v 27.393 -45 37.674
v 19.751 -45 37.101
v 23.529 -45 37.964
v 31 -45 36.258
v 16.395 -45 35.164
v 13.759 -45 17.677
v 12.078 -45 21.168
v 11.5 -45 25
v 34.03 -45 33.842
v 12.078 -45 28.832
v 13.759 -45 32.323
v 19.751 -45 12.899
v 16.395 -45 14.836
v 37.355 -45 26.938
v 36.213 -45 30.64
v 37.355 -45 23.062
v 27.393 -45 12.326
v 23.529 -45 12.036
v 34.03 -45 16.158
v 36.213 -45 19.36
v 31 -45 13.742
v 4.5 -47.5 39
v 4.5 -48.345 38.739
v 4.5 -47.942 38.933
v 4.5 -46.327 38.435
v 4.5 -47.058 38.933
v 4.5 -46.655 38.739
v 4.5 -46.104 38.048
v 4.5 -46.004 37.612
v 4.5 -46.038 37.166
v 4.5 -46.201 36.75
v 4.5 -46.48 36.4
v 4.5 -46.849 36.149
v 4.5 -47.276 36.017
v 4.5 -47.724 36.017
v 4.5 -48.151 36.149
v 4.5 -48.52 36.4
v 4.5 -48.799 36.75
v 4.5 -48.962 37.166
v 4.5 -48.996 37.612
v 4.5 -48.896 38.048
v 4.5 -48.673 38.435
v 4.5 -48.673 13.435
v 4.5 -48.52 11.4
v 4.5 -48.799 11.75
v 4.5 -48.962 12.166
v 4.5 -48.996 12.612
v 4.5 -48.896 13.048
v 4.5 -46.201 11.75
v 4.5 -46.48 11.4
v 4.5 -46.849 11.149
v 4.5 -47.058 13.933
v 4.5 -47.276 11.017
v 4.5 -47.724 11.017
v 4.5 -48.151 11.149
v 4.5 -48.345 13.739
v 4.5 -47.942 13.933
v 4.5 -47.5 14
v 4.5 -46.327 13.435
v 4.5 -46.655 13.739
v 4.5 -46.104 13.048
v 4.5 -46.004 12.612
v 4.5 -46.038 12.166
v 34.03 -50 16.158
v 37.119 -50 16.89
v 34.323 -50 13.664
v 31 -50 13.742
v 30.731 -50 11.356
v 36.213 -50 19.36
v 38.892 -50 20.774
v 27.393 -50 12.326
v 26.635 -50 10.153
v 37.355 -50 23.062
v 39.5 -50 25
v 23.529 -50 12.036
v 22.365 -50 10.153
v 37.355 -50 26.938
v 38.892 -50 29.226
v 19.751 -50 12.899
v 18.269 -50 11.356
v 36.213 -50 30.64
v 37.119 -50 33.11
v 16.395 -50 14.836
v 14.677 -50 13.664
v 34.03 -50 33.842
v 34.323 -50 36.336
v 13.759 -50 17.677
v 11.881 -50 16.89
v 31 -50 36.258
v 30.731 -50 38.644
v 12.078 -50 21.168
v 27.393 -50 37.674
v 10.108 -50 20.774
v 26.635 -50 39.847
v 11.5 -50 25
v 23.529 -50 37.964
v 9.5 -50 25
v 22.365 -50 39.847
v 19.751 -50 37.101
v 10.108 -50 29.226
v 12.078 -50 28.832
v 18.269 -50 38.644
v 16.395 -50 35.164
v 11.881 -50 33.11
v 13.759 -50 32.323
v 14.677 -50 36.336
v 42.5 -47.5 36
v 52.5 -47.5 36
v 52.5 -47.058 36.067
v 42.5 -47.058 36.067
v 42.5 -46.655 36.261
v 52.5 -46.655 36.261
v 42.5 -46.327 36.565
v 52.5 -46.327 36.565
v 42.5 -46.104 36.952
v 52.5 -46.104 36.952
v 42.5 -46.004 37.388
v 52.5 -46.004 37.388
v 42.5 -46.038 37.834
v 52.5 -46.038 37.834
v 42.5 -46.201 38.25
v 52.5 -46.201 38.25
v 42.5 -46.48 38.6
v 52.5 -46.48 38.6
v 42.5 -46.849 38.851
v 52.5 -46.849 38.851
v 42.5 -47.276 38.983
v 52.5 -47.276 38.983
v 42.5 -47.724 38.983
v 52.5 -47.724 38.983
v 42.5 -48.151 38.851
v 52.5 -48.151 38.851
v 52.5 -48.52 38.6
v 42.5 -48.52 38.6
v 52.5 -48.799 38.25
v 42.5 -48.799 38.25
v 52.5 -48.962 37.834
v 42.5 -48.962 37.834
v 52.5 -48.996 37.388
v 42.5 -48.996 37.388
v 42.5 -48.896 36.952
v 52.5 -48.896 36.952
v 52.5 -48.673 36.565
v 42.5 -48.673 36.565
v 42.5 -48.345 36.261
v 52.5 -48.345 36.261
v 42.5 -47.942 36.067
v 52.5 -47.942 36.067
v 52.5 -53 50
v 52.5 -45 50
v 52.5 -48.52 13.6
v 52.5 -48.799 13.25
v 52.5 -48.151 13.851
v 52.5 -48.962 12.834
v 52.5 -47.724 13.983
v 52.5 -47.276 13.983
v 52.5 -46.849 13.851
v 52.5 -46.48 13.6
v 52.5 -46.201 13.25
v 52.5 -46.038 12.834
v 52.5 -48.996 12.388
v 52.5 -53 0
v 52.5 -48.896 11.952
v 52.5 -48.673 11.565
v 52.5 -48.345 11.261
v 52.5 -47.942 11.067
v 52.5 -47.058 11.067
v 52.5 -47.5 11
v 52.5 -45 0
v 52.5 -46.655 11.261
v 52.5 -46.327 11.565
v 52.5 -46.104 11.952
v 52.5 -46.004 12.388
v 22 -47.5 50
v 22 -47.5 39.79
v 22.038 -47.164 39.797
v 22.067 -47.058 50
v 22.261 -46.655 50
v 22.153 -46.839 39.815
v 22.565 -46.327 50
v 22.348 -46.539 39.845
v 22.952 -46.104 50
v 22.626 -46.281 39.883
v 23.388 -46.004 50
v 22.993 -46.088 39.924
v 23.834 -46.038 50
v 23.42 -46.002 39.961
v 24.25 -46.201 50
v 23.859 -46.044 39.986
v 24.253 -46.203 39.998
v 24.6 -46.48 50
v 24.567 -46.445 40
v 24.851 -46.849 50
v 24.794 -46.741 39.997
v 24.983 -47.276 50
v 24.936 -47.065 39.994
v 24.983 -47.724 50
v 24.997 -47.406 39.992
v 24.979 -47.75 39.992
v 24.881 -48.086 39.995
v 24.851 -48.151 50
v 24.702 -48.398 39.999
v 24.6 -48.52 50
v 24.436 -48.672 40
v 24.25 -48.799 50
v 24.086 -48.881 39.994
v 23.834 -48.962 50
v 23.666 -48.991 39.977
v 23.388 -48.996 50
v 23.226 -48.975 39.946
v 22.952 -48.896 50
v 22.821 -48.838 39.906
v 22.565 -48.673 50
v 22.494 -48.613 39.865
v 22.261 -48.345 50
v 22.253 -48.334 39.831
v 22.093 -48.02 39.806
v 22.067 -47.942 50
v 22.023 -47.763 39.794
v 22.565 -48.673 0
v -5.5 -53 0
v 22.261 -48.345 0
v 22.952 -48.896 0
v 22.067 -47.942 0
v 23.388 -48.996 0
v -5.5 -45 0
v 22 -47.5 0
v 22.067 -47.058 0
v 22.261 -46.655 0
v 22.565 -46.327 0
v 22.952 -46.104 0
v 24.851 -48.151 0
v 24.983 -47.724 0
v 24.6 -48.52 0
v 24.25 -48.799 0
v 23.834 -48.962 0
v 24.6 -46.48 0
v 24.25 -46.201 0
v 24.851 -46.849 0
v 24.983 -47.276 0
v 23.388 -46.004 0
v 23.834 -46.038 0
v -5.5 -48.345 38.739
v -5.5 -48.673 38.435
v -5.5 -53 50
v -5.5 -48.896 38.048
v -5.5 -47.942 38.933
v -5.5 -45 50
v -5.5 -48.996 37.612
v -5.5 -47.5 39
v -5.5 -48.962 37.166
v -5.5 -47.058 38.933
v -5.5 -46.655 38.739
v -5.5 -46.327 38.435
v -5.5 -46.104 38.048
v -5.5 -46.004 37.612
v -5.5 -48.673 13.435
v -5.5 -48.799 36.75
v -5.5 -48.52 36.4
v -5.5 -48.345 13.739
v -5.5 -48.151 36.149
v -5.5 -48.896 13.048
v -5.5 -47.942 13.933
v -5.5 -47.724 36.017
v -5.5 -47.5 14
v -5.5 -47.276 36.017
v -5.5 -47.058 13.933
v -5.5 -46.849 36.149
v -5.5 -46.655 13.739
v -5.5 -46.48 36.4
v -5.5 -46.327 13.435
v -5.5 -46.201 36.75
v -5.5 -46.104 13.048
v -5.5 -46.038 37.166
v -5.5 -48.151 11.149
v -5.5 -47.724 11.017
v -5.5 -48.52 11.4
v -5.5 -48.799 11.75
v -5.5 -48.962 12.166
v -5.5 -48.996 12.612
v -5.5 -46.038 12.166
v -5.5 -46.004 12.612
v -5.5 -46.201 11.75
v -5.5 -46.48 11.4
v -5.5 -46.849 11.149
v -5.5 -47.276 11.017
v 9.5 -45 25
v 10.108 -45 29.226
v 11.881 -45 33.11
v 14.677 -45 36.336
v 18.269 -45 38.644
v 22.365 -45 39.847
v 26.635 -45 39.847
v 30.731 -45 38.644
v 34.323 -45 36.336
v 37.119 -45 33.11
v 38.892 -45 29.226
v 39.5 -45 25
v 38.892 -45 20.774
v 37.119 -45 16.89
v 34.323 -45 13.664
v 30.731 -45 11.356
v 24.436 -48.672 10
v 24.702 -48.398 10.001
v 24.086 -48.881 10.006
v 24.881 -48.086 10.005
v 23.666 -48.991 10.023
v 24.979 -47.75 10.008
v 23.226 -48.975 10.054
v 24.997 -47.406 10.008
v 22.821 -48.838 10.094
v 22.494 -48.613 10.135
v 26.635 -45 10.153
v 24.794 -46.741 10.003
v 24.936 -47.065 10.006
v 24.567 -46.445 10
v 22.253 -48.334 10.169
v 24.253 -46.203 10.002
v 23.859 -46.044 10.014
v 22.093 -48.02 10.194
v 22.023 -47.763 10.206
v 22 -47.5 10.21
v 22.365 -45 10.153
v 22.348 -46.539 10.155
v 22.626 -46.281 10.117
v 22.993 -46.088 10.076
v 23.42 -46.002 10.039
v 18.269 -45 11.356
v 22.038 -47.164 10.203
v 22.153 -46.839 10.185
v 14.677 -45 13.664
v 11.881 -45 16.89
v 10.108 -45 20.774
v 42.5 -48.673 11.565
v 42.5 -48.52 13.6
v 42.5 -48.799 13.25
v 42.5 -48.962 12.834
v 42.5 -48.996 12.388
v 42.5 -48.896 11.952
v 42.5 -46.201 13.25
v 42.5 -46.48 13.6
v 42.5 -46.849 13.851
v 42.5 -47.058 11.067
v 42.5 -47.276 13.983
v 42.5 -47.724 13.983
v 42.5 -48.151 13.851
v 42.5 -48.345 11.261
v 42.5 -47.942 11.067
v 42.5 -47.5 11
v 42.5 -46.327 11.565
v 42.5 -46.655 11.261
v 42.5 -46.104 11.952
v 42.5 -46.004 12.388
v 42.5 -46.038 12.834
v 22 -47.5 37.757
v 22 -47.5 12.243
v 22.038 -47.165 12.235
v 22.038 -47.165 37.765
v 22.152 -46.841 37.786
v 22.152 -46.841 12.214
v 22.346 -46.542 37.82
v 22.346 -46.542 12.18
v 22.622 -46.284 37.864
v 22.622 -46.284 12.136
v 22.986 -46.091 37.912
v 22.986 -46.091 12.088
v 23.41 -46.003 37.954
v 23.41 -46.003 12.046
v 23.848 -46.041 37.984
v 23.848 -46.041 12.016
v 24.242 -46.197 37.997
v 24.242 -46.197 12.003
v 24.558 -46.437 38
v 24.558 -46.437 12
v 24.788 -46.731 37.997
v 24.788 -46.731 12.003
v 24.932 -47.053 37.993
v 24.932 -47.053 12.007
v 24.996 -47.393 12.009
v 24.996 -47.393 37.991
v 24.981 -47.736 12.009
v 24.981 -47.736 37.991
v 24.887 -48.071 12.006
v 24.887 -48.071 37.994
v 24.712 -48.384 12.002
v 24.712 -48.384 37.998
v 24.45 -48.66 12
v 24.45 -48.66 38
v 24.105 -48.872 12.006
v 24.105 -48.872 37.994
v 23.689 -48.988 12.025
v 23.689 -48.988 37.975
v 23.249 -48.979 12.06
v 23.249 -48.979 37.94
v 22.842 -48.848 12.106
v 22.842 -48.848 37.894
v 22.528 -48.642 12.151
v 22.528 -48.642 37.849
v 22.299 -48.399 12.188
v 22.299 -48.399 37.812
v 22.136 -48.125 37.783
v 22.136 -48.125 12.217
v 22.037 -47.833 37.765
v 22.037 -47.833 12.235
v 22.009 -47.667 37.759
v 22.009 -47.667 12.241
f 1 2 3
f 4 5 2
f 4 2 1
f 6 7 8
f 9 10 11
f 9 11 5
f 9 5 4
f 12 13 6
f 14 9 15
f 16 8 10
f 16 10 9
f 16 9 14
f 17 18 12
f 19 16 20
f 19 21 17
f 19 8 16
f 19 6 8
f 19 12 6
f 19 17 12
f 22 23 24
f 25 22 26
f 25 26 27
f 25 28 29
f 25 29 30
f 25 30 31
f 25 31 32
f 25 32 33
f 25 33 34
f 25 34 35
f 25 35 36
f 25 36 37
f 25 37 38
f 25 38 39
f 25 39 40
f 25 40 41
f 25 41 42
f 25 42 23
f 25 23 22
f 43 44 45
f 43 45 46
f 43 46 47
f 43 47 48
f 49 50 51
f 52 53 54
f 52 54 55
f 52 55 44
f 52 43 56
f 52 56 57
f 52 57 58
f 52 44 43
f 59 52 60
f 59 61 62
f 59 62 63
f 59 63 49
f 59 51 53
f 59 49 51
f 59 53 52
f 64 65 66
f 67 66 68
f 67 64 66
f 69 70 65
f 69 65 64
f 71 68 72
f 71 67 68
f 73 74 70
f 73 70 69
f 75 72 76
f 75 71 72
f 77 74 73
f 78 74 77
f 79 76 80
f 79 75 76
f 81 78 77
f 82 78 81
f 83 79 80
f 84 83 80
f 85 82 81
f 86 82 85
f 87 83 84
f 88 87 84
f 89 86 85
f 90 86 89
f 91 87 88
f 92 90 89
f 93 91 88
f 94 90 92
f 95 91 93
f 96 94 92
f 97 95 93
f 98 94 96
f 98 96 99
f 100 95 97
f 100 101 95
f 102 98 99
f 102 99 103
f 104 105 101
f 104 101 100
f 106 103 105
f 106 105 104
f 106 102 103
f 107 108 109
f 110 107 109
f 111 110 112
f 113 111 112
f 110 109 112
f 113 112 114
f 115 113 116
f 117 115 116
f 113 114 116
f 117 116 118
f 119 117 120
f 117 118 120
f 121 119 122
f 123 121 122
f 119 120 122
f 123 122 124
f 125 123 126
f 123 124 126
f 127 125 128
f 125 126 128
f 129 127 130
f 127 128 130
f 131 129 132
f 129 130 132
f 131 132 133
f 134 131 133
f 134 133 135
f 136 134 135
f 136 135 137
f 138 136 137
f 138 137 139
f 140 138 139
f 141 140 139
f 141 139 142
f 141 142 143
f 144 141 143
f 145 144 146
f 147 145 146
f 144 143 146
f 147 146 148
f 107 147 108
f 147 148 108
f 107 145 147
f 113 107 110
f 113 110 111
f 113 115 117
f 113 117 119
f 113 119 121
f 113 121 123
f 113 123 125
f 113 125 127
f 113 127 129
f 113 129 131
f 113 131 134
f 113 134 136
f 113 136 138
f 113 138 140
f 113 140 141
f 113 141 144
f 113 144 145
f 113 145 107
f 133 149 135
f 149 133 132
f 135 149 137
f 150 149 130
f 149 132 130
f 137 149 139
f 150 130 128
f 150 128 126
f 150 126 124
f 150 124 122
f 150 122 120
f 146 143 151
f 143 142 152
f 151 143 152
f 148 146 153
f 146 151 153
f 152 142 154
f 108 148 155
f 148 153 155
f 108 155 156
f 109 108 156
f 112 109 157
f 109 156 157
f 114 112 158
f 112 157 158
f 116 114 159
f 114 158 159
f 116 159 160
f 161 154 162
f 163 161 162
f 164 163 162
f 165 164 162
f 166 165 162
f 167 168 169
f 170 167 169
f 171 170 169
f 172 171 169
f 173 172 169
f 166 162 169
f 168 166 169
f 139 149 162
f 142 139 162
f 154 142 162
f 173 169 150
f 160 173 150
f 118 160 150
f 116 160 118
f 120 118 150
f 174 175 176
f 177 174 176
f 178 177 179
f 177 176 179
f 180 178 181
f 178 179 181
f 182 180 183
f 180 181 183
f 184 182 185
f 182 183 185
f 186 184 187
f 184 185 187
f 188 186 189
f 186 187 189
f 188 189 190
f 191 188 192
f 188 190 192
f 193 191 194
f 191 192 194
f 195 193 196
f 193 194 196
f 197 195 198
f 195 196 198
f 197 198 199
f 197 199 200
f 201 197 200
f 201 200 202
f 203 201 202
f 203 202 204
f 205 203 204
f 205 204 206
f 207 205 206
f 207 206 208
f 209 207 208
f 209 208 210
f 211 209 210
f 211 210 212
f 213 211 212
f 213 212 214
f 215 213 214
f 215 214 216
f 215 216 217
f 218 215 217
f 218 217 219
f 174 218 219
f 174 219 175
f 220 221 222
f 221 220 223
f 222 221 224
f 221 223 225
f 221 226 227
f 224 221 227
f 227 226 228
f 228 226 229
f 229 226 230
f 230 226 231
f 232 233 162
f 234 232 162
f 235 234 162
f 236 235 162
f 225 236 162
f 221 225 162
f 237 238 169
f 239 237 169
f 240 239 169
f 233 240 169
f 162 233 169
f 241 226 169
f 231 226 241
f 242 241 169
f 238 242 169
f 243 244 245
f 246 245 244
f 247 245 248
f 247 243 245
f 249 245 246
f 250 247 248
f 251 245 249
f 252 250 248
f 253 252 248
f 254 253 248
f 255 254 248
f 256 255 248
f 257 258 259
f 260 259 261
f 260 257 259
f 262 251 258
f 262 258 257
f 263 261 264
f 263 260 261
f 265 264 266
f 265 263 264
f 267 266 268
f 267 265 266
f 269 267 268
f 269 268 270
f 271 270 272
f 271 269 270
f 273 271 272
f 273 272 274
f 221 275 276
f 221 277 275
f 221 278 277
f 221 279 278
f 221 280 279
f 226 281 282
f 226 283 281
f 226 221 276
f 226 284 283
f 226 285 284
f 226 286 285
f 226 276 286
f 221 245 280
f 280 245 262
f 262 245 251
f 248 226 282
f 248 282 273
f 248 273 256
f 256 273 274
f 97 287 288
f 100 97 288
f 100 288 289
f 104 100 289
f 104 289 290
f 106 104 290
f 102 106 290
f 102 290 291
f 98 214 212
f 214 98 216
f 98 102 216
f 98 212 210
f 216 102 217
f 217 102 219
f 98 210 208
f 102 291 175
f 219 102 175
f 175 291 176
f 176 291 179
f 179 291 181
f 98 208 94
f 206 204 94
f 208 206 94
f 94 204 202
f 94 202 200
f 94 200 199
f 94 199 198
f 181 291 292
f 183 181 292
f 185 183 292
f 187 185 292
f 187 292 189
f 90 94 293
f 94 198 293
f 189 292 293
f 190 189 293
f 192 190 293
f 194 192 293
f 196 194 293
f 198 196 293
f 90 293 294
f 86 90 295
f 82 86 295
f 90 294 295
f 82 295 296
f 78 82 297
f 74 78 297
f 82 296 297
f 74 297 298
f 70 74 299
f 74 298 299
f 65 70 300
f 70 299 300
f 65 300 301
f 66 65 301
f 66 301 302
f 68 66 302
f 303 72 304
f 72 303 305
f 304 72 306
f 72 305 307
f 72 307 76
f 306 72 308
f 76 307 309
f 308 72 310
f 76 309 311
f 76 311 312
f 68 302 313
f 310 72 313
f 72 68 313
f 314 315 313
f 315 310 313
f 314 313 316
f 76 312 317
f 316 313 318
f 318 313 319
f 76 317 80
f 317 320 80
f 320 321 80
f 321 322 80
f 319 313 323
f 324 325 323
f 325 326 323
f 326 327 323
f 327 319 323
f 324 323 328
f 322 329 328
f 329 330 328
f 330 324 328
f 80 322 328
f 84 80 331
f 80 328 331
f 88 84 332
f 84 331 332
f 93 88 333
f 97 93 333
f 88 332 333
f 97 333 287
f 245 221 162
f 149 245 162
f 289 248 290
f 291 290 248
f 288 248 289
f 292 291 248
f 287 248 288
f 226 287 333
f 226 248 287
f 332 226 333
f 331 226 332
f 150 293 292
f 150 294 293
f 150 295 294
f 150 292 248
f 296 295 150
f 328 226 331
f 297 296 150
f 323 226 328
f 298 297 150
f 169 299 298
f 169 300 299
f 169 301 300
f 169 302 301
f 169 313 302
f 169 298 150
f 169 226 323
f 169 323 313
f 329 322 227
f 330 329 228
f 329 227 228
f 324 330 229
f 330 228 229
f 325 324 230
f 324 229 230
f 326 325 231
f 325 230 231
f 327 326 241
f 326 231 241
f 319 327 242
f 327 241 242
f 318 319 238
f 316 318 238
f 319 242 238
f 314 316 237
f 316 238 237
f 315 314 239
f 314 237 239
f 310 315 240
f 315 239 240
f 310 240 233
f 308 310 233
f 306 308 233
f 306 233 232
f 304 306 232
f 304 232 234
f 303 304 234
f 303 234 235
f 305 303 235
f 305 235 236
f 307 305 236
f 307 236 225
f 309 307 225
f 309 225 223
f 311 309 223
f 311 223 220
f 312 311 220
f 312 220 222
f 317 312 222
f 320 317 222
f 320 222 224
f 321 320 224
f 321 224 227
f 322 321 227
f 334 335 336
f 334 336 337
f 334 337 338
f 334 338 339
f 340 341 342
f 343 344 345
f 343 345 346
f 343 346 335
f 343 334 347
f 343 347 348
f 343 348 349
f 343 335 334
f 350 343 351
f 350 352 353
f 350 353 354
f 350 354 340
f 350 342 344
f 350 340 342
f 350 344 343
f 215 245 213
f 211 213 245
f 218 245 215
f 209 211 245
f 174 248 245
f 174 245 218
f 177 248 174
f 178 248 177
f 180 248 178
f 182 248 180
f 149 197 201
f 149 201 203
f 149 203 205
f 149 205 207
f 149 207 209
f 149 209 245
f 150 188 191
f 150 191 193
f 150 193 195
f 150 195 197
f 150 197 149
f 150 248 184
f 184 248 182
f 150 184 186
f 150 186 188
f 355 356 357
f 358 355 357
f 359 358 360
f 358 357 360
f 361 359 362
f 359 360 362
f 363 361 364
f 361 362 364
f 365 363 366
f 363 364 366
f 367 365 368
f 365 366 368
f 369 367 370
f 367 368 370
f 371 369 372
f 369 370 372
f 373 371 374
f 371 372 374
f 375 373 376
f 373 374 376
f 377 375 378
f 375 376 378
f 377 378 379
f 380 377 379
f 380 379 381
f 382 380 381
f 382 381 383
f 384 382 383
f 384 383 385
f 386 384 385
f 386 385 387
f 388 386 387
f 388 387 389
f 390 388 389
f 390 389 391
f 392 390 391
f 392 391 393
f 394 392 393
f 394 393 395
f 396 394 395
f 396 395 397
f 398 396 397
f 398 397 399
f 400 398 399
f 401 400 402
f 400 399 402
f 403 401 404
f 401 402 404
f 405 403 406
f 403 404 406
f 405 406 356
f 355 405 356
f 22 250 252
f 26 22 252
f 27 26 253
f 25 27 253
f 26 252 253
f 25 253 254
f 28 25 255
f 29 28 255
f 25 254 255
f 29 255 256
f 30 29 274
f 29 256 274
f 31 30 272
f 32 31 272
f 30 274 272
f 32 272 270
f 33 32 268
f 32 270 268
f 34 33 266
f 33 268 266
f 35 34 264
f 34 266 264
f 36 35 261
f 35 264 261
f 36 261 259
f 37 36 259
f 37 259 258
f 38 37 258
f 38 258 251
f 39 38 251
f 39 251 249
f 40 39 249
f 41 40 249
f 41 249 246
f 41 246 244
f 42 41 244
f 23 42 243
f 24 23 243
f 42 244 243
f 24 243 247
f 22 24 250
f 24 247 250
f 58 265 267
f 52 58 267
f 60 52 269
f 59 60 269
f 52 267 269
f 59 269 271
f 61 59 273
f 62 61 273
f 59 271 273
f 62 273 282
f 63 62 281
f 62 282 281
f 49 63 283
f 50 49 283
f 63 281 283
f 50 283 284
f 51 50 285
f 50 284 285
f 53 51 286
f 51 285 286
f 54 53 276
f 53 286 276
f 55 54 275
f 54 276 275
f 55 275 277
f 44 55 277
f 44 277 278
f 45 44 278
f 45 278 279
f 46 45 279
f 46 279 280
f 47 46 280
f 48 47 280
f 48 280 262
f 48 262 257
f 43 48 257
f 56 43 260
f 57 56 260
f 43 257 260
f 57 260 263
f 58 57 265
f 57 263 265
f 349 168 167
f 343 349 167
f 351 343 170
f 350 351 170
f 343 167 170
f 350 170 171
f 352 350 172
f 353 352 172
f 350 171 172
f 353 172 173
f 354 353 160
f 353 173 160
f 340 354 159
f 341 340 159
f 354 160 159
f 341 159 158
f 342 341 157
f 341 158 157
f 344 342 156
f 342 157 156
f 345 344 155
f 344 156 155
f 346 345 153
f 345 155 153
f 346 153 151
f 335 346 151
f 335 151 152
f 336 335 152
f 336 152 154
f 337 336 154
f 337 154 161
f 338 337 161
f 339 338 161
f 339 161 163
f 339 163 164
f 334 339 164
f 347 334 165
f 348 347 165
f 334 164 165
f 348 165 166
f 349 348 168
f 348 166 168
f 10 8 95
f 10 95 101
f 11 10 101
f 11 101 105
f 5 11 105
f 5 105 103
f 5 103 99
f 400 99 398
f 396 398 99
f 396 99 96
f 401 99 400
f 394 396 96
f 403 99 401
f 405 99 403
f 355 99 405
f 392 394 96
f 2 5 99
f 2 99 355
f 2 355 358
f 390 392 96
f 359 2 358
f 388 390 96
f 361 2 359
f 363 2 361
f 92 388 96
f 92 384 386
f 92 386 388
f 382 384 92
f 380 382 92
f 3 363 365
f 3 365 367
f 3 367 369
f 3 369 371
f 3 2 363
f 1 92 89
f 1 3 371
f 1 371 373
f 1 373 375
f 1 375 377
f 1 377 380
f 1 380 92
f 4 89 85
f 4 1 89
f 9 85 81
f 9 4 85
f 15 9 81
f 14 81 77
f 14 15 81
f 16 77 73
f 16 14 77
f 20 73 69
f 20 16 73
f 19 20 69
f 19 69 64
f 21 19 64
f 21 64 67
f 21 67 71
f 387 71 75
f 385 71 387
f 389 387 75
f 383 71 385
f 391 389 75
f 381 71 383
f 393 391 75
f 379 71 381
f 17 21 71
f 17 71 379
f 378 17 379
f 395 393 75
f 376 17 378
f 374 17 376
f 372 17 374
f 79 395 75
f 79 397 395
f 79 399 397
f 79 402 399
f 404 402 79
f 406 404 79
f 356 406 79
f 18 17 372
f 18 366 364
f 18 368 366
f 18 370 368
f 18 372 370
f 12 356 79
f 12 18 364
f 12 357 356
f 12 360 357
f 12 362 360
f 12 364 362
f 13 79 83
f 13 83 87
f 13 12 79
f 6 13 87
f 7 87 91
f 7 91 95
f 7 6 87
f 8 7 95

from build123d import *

# Parameters (mm, degrees)
ESQUISSE1_W             = 58
ESQUISSE1_H             = 8
BOSS_EXTRU_1_DEPTH      = 50
ESQUISSE2_R             = 15
ESQUISSE2_R_2           = 13
ENL_V_MAT_EXTRU_1_DEPTH = 5
ESQUISSE3_R             = 1.5
ENL_V_MAT_EXTRU_2_DEPTH = 10
ESQUISSE4_R             = 1.5
ENL_V_MAT_EXTRU_3_DEPTH = 10
ESQUISSE5_R             = 1.5
ENL_V_MAT_EXTRU_4_DEPTH = 51


with BuildPart() as part:
    # Esquisse1 → Boss.-Extru.1 (new body)
    with BuildSketch(Plane.XY):
        with Locations((23.5, -49)):
            Rectangle(ESQUISSE1_W, ESQUISSE1_H)
    extrude(amount=BOSS_EXTRU_1_DEPTH)

    # Esquisse2 → Enlèv. mat.-Extru.1 (cut)
    with BuildSketch(Plane(origin=(0, -45, 0), x_dir=(-1, 0, 0), z_dir=(0, 1, 0))):
        with Locations((-24.5, 25)):
            Circle(ESQUISSE2_R)
        with Locations((-24.5, 25)):
            Circle(ESQUISSE2_R_2, mode=Mode.SUBTRACT)
    extrude(amount=-ENL_V_MAT_EXTRU_1_DEPTH, mode=Mode.SUBTRACT)

    # Esquisse3 → Enlèv. mat.-Extru.2 (cut)
    with BuildSketch(Plane.ZY.offset(5.5)):
        with Locations((12.5, -47.5)):
            Circle(ESQUISSE3_R)
        with Locations((37.5, -47.5)):
            Circle(ESQUISSE3_R)
    extrude(amount=-ENL_V_MAT_EXTRU_2_DEPTH, mode=Mode.SUBTRACT)

    # Esquisse4 → Enlèv. mat.-Extru.3 (cut)
    with BuildSketch(Plane(origin=(52.5, 0, 0), x_dir=(0, 0, -1), z_dir=(1, 0, 0))):
        with Locations((-37.5, -47.5)):
            Circle(ESQUISSE4_R)
        with Locations((-12.5, -47.5)):
            Circle(ESQUISSE4_R)
    extrude(amount=-ENL_V_MAT_EXTRU_3_DEPTH, mode=Mode.SUBTRACT)

    # Esquisse5 → Enlèv. mat.-Extru.4 (cut, through all)
    with BuildSketch(Plane(origin=(0, 0, 0), x_dir=(-1, 0, 0), z_dir=(0, 0, -1))):
        with Locations((-23.5, -47.5)):
            Circle(ESQUISSE5_R)
    extrude(amount=-ENL_V_MAT_EXTRU_4_DEPTH, mode=Mode.SUBTRACT)


solid = part.part
